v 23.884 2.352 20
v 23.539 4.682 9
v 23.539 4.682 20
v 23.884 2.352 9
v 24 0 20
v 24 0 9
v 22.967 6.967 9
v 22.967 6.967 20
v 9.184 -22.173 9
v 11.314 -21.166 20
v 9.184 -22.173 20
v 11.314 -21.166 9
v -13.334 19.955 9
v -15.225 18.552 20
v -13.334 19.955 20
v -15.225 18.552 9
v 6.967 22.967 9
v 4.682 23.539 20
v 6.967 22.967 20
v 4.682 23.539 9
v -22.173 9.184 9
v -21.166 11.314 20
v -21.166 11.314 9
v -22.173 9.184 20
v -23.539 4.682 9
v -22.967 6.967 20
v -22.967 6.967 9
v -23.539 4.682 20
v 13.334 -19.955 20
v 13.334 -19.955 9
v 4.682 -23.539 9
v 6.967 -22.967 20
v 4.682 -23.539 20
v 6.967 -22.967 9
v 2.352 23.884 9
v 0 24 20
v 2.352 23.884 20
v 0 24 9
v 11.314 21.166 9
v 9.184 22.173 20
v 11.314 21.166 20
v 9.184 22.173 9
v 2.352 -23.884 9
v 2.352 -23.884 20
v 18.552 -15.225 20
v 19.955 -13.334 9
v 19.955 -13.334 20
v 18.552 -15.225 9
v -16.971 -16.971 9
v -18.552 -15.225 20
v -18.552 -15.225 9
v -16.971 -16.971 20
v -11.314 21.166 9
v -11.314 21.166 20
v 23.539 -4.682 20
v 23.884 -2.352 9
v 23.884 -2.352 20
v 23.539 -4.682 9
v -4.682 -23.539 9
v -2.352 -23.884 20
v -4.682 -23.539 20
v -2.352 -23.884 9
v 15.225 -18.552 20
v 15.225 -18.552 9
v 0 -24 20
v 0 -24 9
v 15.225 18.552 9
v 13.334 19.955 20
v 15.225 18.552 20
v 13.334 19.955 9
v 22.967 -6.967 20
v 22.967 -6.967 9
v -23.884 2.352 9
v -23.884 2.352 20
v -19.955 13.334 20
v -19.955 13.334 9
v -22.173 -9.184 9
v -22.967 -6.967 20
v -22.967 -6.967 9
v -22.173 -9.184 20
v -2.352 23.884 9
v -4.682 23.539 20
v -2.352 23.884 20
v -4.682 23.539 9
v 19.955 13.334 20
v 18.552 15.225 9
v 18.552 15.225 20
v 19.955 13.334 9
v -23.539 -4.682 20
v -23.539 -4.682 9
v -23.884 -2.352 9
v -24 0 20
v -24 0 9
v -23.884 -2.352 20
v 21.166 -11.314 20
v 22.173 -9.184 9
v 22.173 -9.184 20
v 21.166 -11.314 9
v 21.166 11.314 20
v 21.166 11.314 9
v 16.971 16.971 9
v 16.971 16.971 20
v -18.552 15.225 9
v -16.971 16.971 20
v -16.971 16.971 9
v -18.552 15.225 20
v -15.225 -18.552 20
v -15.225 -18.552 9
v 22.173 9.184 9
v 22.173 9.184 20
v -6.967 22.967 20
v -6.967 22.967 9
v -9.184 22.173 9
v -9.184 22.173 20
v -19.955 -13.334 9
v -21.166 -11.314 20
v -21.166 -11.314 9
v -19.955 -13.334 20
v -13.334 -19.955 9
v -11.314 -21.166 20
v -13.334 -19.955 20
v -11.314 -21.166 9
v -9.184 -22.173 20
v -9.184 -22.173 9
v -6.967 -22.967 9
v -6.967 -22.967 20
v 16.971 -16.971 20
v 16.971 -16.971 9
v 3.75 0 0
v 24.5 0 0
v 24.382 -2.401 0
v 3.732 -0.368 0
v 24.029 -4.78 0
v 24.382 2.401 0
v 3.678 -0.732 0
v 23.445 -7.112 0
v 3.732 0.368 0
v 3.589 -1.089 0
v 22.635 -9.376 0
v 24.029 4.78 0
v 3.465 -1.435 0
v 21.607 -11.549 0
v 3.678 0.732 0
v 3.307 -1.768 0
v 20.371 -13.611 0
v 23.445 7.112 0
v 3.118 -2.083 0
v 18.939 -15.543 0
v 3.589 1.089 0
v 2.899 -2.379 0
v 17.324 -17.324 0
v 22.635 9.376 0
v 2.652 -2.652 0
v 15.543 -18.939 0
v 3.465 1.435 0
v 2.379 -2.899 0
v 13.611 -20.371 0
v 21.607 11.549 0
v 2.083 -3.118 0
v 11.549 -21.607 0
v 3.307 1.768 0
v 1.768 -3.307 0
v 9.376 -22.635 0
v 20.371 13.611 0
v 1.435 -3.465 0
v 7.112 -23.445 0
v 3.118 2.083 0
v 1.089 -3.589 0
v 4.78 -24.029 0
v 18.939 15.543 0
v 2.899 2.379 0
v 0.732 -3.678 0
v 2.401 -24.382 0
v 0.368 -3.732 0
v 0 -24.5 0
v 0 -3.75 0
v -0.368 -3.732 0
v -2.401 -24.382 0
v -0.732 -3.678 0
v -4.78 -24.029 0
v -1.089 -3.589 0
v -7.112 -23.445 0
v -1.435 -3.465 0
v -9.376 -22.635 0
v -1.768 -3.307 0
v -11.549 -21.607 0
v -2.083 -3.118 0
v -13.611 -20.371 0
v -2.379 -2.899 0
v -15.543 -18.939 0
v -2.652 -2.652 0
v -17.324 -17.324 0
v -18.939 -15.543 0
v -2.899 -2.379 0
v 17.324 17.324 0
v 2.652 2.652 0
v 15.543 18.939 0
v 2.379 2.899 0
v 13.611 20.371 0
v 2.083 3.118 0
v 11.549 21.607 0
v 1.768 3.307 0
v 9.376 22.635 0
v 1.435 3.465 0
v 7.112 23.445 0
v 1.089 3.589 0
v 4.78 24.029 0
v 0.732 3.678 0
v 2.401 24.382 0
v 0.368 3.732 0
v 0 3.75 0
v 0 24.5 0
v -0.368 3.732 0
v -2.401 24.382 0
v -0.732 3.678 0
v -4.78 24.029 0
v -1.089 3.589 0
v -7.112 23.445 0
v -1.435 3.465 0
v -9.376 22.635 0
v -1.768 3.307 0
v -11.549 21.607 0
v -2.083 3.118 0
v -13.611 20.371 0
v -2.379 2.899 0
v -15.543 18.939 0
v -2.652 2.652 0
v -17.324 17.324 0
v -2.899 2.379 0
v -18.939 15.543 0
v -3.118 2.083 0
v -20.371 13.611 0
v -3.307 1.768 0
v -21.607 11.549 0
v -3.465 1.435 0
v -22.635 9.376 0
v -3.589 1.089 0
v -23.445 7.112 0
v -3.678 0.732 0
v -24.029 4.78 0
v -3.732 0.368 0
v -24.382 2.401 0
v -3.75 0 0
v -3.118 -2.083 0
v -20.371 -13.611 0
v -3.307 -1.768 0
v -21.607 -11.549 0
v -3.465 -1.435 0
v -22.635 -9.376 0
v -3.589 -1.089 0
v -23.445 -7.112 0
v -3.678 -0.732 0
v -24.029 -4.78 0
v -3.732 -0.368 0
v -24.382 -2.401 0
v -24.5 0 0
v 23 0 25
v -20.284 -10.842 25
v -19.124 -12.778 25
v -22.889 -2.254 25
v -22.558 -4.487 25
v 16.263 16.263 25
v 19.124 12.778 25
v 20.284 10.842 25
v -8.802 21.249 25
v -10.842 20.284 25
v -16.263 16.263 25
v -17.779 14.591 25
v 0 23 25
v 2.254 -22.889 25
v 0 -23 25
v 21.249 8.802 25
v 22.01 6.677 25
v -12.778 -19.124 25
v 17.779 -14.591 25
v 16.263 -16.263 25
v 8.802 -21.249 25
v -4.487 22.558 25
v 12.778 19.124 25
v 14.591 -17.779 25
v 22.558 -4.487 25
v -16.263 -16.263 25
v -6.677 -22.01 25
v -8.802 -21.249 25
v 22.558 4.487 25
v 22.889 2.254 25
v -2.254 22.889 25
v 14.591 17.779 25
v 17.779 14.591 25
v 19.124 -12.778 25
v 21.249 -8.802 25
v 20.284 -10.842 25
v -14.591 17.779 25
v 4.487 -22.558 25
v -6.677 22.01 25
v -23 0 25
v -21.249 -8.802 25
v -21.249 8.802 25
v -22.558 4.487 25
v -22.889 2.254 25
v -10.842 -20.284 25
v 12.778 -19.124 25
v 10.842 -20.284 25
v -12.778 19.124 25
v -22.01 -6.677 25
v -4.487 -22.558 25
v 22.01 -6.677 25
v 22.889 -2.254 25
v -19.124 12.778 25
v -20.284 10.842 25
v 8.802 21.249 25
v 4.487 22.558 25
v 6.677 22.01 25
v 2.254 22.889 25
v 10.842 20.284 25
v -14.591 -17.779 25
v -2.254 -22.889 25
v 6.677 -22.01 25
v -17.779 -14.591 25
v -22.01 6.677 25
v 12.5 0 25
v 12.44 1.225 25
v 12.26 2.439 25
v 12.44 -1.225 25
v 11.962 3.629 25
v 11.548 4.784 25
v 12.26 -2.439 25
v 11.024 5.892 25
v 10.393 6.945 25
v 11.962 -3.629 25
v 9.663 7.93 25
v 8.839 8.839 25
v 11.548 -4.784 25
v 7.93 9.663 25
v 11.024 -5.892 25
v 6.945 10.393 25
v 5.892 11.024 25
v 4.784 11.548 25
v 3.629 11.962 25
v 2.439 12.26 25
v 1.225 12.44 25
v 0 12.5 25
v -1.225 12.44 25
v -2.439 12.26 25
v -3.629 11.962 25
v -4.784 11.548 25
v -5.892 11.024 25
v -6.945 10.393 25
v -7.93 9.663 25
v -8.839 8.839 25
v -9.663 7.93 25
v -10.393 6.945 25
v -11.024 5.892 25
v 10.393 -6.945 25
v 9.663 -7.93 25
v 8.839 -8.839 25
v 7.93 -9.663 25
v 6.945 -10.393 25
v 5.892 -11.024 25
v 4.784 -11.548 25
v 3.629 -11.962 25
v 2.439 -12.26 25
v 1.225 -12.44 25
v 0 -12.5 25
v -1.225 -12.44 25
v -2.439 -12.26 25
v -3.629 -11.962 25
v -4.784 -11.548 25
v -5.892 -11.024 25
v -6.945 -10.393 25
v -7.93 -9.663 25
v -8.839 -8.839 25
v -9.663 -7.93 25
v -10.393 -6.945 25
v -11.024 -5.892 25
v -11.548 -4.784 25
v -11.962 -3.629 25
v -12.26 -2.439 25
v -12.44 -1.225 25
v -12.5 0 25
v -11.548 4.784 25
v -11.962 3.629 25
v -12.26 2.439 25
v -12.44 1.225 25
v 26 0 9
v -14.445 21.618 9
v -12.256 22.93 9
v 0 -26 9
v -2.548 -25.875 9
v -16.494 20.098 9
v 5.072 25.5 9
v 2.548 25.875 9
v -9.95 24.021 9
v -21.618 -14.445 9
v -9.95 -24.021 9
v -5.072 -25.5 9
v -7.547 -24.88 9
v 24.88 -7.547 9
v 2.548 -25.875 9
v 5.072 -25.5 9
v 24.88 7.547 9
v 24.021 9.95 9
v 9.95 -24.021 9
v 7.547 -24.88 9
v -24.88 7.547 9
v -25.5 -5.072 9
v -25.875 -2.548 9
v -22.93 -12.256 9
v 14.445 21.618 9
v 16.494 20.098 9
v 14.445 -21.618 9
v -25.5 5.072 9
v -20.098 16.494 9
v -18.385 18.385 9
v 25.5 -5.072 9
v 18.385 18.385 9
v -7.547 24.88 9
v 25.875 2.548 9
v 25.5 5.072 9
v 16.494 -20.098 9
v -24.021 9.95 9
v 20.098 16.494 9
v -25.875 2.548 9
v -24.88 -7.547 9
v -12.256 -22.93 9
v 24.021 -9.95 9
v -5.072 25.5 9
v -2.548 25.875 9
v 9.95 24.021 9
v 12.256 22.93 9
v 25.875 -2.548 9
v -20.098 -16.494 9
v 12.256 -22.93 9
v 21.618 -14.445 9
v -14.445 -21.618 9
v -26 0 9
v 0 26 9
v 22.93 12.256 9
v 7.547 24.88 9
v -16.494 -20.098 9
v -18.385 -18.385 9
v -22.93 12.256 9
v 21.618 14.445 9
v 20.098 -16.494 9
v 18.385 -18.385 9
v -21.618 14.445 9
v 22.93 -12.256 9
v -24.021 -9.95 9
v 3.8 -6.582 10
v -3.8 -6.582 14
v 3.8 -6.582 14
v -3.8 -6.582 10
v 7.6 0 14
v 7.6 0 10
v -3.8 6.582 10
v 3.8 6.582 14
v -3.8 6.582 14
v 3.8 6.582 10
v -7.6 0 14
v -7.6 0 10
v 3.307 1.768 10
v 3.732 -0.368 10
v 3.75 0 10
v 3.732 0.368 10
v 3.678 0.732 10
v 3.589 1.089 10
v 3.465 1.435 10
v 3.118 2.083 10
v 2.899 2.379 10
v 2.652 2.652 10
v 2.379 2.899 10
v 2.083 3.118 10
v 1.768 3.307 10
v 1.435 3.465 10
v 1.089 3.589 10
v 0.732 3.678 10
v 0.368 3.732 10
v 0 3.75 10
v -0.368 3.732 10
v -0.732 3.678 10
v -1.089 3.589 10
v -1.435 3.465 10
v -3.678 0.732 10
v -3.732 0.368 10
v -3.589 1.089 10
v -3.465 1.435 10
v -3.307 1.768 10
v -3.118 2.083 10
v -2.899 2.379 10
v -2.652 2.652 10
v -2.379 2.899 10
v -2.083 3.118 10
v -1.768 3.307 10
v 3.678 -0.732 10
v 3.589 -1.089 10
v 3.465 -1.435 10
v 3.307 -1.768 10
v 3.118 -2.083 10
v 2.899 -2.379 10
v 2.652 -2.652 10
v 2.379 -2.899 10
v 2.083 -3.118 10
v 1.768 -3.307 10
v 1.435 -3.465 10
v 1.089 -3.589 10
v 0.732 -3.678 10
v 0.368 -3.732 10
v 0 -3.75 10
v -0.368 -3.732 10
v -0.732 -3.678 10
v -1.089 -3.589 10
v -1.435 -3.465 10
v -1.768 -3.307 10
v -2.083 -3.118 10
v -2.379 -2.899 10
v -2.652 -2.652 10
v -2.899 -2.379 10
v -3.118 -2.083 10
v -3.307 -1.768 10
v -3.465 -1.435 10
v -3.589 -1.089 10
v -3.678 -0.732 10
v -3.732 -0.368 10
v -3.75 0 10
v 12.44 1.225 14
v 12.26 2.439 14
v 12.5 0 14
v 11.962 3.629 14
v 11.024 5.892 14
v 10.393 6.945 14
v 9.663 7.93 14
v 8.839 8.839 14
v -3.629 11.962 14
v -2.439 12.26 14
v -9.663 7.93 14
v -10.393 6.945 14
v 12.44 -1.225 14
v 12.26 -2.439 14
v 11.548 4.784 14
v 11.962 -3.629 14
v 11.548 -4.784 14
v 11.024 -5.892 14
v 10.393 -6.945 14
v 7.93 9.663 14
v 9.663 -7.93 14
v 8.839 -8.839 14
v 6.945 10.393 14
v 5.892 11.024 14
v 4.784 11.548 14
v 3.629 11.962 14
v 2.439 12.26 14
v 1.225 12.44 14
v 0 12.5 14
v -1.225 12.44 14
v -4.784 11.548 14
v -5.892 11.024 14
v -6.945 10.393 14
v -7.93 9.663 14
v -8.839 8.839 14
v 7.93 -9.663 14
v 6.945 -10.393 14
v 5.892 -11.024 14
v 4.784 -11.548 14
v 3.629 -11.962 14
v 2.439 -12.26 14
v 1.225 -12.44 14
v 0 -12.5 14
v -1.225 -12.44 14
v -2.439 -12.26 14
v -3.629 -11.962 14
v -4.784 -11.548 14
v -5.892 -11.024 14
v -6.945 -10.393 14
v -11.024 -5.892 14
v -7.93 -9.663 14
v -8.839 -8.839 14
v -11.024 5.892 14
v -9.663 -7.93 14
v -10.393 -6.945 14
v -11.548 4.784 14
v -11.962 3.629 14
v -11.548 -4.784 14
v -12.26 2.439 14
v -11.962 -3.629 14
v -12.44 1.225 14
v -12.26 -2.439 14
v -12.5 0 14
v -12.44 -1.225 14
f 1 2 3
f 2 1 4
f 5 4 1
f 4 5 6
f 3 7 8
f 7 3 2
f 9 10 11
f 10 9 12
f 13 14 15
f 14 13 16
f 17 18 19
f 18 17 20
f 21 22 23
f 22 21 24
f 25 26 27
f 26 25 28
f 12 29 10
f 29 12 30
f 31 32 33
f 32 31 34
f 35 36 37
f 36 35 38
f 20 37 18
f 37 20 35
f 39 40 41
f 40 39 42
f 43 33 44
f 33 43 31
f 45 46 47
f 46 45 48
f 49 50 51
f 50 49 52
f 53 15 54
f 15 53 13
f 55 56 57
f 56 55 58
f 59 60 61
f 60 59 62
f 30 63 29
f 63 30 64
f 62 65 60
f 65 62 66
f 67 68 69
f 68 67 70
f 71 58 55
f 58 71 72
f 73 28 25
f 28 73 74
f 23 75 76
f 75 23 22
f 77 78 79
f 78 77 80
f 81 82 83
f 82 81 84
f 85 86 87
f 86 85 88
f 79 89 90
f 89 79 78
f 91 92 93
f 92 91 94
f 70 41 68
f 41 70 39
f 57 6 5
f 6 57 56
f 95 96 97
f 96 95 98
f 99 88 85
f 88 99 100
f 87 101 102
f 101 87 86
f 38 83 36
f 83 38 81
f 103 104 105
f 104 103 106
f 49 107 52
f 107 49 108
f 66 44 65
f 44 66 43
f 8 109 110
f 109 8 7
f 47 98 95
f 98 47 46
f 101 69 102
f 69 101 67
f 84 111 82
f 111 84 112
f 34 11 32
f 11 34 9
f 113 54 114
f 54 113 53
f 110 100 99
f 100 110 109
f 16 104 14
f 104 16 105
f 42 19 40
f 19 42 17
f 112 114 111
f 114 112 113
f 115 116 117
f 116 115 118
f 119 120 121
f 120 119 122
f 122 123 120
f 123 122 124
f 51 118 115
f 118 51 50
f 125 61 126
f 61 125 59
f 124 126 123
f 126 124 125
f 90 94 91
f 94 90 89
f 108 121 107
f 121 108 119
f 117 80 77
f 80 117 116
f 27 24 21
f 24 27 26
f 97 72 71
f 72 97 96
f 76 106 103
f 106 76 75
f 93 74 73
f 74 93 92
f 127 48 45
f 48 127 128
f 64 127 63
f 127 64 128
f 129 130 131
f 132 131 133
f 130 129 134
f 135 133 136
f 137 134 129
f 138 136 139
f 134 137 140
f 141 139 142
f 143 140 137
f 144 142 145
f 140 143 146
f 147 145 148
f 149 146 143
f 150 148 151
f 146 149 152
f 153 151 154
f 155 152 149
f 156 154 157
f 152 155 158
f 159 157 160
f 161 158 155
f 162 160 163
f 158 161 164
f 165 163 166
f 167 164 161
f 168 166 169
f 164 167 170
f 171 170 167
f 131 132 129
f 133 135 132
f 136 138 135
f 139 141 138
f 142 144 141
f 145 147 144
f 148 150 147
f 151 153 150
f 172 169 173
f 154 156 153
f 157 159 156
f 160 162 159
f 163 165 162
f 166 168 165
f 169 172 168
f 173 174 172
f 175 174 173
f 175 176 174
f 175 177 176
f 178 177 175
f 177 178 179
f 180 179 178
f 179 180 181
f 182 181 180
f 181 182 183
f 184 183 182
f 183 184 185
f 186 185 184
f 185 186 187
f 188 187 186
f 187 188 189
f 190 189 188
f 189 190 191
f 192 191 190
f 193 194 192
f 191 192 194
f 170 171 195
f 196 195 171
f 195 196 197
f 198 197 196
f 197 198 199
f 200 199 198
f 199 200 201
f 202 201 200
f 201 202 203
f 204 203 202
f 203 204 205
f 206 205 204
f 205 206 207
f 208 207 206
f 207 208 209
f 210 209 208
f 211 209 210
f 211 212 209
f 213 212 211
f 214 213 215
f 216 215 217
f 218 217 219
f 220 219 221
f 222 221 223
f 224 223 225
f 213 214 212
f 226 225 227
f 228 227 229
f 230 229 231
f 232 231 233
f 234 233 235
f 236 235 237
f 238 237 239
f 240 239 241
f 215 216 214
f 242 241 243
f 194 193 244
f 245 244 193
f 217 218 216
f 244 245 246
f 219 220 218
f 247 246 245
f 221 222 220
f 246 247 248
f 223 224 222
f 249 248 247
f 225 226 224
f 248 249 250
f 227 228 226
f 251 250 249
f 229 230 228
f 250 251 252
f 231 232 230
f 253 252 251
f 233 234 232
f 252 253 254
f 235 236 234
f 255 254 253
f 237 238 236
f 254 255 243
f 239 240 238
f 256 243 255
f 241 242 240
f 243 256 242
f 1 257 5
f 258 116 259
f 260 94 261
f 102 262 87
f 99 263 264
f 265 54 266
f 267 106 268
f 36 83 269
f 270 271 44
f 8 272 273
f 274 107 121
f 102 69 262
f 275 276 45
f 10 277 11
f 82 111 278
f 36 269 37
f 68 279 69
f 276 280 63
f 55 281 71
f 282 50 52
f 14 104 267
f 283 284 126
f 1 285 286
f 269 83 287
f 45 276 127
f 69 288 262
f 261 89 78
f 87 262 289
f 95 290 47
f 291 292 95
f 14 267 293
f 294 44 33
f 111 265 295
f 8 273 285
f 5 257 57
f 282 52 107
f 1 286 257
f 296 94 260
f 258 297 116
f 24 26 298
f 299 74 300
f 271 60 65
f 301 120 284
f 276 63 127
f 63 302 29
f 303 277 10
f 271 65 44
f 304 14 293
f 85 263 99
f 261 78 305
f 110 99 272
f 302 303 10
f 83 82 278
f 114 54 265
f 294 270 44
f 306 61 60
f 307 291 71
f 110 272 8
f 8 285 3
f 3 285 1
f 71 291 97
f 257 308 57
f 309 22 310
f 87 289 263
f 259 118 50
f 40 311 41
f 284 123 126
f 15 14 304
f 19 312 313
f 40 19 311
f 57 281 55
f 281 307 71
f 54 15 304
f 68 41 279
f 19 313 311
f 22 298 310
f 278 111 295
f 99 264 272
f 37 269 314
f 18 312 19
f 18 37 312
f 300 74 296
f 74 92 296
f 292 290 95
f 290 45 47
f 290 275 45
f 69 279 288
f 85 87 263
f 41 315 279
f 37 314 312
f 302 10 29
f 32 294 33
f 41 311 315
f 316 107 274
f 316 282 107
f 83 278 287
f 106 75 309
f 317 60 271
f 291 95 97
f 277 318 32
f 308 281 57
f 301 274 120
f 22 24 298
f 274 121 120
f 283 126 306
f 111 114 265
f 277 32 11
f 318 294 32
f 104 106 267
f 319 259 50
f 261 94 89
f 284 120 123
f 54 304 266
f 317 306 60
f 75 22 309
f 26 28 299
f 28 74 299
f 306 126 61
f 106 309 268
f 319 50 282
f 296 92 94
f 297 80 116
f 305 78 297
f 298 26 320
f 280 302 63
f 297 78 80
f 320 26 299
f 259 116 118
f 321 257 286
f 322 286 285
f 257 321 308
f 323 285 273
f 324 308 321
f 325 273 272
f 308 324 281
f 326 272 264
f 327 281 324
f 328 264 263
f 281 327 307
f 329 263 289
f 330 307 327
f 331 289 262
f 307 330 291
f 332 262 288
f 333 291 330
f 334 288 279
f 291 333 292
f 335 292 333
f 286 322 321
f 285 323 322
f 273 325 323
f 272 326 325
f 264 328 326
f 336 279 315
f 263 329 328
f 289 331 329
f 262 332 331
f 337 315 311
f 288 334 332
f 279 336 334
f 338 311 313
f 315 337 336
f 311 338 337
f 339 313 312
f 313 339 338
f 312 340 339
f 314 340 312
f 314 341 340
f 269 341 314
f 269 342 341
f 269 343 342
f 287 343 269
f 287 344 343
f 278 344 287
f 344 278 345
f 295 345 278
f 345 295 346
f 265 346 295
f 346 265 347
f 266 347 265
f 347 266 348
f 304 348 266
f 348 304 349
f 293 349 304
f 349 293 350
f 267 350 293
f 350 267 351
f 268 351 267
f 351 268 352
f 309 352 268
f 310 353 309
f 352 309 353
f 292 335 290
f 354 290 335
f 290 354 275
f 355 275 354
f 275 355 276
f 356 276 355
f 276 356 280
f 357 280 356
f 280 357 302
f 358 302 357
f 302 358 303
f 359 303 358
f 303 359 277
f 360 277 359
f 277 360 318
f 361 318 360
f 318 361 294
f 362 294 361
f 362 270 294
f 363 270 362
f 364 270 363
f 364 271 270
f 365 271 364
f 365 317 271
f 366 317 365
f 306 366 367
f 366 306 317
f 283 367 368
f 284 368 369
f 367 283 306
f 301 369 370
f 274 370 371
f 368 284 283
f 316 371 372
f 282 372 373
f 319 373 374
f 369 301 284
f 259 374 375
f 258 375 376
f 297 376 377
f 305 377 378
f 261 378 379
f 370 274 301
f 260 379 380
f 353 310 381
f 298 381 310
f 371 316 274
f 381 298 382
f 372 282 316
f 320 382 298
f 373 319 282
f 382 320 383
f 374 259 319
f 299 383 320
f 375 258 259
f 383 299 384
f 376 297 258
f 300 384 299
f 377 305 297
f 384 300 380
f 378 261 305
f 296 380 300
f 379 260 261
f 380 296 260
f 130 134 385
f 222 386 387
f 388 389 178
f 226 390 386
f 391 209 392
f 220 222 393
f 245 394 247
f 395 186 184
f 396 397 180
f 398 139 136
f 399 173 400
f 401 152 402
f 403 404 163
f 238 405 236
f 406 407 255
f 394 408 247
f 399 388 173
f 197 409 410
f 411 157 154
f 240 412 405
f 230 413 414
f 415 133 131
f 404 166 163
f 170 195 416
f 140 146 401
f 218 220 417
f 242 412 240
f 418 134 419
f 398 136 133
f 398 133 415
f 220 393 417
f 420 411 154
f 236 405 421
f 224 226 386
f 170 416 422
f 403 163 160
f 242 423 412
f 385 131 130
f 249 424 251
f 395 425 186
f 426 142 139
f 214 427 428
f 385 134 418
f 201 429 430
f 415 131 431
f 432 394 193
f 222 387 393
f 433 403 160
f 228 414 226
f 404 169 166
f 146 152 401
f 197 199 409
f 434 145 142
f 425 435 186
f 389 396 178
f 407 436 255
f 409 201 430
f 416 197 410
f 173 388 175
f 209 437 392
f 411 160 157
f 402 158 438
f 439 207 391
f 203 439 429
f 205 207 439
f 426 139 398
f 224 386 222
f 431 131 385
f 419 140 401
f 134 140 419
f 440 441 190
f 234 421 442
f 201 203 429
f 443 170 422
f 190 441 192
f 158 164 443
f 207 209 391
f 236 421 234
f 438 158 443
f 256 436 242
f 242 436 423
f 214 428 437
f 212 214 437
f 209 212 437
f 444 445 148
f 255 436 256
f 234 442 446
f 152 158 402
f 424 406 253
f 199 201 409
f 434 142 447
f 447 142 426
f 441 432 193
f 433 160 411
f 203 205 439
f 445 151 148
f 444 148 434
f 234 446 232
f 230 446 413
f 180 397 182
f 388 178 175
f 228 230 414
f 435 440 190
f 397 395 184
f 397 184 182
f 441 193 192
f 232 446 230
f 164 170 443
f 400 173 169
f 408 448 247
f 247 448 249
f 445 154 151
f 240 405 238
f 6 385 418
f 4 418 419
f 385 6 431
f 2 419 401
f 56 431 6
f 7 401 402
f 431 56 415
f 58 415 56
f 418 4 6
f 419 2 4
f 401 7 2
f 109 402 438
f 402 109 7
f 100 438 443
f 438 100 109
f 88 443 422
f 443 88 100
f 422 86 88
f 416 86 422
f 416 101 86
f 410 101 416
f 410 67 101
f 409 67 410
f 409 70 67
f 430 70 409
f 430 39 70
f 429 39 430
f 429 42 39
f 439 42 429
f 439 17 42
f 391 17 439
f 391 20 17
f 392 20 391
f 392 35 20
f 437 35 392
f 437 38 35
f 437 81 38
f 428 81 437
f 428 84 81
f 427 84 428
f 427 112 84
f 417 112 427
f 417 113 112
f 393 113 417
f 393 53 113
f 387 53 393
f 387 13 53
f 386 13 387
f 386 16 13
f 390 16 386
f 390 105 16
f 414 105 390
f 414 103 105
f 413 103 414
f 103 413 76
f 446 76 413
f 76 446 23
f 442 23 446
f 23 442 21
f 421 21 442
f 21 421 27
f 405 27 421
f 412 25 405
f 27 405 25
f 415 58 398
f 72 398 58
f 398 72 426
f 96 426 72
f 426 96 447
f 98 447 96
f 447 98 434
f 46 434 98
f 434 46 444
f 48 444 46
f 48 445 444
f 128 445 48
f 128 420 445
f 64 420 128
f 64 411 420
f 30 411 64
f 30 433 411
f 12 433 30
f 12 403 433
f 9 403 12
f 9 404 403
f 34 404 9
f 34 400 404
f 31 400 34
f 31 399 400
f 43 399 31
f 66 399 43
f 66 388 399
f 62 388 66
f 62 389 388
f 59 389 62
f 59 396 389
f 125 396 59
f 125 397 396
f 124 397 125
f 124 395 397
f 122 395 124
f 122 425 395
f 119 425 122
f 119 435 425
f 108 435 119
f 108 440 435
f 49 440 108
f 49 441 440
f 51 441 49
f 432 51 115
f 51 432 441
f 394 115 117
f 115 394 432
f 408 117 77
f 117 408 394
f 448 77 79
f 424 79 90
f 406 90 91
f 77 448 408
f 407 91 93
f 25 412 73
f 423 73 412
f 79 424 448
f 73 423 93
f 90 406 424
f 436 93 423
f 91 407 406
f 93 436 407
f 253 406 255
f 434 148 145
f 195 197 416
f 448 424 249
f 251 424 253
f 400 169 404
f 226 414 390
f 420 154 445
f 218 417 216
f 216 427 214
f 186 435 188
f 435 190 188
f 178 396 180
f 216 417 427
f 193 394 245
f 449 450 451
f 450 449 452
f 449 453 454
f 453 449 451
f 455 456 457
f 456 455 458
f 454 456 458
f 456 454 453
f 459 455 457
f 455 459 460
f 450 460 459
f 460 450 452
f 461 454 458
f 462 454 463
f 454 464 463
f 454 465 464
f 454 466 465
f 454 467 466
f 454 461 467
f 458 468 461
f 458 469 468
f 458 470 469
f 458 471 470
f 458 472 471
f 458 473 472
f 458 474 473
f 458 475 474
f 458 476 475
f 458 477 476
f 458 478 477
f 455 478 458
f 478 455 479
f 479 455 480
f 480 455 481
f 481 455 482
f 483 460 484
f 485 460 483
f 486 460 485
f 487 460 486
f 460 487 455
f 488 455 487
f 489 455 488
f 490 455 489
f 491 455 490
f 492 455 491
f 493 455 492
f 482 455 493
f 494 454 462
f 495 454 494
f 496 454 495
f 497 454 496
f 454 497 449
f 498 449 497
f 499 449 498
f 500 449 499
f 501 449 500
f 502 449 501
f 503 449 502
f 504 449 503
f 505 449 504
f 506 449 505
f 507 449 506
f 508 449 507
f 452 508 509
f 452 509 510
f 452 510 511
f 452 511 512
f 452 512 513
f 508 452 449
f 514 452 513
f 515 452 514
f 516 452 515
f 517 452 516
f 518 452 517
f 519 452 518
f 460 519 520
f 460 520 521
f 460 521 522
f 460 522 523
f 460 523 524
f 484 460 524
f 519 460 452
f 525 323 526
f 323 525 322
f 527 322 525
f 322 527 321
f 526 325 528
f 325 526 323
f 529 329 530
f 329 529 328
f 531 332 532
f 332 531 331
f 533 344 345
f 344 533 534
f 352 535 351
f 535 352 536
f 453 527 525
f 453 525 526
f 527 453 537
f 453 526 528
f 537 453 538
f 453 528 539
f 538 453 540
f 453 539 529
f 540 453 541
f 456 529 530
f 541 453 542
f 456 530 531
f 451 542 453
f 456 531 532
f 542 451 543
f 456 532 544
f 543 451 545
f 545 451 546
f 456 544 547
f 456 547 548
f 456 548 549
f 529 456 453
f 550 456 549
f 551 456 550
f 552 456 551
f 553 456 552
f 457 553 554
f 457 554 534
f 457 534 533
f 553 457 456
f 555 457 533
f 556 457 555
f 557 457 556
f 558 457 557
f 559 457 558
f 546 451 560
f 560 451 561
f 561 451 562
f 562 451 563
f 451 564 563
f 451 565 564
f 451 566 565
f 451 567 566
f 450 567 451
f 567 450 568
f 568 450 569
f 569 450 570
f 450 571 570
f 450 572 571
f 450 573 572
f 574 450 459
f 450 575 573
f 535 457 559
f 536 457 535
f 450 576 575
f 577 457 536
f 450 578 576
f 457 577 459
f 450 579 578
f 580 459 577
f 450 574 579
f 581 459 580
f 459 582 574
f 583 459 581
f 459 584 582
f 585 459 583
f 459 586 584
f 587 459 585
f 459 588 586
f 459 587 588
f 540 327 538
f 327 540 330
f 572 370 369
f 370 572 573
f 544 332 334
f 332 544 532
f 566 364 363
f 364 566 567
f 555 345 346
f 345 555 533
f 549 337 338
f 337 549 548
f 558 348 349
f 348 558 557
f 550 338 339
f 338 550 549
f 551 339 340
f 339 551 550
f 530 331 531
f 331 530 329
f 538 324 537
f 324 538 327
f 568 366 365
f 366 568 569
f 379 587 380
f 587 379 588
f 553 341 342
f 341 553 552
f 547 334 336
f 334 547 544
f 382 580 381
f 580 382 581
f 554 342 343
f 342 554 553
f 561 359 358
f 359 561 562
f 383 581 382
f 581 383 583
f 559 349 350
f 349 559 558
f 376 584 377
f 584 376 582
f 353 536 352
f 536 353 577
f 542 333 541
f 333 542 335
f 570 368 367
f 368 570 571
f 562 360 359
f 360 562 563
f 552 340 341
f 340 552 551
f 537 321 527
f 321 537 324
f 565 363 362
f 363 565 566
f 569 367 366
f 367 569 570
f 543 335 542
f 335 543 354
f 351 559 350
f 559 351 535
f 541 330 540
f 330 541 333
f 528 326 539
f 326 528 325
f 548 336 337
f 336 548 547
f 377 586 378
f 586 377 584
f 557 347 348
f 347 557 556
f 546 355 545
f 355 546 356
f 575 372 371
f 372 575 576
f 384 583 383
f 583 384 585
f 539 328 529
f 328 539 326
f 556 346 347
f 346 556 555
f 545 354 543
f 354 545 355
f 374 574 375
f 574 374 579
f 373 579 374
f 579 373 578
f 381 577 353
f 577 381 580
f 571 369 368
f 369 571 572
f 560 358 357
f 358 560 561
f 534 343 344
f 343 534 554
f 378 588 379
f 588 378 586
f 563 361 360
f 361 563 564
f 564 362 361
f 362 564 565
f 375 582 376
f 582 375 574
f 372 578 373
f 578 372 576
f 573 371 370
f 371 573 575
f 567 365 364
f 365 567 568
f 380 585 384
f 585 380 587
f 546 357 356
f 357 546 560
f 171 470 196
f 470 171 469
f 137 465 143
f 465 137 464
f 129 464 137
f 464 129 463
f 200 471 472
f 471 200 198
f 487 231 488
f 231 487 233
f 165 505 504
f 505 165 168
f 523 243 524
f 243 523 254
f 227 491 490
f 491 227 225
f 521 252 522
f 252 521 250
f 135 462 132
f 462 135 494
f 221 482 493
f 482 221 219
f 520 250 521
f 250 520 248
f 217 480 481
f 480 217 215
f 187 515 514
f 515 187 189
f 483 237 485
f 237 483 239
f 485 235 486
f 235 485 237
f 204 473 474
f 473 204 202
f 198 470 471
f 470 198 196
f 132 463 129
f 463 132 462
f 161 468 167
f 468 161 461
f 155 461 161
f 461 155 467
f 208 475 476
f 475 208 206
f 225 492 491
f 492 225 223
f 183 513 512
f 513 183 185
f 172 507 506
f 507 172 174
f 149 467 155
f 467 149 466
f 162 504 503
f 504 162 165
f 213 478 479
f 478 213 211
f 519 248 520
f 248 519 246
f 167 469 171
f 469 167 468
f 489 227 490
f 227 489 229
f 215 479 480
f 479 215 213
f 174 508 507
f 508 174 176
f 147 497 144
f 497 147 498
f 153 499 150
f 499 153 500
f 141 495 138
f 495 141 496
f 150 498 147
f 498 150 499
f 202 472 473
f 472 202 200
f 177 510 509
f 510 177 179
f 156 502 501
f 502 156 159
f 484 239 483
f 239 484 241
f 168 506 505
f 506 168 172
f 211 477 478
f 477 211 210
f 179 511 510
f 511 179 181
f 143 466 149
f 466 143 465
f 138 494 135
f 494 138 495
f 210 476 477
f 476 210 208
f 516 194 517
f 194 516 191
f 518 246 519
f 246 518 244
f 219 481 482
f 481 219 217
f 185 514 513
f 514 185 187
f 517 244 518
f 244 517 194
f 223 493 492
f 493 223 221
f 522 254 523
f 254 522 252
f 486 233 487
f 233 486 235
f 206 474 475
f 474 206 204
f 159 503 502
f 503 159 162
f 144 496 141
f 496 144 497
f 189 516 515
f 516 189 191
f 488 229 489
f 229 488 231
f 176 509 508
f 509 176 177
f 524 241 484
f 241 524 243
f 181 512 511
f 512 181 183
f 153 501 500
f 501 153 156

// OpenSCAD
/*
Foot for IKEA Vika table leg.

License: Attribution 4.0 International (CC BY 4.0) 
*/
$fn=64;

difference(){
union(){
cylinder(h=20,d=48,center=false);
translate([0,0,20])
cylinder(h=5,d1=48,d2=46,center=false);
cylinder(h=9,d1=49,d2=52,center=false);
}
translate([0,0,10])
cylinder(h=10,d=15.2,center=false,$fn=6);
translate([0,0,14])
cylinder(h=22,d=25,center=false);
cylinder(h=32,d=7.5,center=true);
}
